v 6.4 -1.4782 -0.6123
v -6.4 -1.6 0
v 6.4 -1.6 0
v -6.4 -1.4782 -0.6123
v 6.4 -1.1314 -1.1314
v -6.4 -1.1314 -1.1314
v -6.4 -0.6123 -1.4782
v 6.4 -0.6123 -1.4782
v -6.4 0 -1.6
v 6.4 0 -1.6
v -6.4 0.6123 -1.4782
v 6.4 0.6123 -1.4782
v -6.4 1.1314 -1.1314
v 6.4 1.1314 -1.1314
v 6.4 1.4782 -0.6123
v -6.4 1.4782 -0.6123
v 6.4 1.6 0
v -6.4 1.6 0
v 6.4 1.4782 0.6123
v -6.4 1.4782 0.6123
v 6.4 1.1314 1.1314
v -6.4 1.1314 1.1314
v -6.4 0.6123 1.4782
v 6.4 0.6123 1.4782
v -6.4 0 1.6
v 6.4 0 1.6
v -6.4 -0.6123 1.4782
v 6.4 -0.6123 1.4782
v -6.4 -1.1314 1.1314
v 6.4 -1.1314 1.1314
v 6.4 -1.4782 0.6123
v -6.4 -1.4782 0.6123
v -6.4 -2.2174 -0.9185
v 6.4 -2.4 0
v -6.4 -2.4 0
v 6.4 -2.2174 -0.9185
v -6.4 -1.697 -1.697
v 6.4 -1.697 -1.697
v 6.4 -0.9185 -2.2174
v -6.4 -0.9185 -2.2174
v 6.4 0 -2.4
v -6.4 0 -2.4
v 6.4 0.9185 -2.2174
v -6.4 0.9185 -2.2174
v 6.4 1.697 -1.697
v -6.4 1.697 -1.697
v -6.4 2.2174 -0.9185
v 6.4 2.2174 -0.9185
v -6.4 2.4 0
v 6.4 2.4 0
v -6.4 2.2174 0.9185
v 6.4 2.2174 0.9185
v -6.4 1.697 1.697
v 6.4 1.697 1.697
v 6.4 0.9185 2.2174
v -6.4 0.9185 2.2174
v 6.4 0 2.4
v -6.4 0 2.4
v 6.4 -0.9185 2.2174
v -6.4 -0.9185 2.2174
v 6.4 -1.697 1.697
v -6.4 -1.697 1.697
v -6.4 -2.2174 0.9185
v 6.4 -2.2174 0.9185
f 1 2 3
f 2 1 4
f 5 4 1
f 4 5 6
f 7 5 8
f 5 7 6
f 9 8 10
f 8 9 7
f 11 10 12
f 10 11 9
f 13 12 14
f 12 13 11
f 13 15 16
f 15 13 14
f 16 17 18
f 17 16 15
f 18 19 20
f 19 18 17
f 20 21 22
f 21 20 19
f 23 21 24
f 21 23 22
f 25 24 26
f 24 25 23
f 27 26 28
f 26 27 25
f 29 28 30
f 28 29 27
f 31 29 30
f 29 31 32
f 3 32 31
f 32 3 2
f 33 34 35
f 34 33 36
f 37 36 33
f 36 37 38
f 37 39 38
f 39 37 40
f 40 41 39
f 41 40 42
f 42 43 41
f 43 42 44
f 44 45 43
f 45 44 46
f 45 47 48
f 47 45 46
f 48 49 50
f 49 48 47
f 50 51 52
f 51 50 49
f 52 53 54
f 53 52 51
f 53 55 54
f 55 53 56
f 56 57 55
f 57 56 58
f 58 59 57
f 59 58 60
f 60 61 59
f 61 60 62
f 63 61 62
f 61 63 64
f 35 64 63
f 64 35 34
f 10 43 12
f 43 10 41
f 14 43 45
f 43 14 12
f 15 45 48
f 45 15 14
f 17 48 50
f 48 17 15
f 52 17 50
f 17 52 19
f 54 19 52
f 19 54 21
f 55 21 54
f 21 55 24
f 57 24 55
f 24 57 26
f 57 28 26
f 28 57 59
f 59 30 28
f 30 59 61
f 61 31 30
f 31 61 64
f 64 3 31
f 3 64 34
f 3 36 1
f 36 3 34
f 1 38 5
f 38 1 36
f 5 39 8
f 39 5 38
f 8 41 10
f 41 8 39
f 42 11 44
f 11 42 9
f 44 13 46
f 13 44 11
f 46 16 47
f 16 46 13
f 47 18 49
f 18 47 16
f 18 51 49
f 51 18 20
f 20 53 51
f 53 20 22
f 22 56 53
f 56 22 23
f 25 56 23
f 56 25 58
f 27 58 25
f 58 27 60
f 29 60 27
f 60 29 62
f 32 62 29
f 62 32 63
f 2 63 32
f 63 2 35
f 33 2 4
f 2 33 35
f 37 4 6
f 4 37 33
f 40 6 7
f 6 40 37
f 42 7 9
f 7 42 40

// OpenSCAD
// file: ../p/4-4ring2.scad
use <../lib.scad>
function ldraw_lib__4_4ring2() = [
// 0 Ring  2 x 1.0
// 0 Name: 4-4ring2.dat
// 0 Author: James Jessiman
// 0 !LDRAW_ORG Primitive UPDATE 2009-01
// 0 !LICENSE Licensed under CC BY 2.0 and CC BY 4.0 : see CAreadme.txt
// 
// 0 BFC CERTIFY CCW
  [0,"BFC","CERTIFY"],
  [0,"BFC","CCW"],
// 
// 0 !HISTORY 1998-12-15 [PTadmin] Official Update 1998-10
// 0 !HISTORY 2002-04-05 [hafhead] Added BFC statement
// 0 !HISTORY 2002-04-25 [PTadmin] Official Update 2002-02
// 0 !HISTORY 2007-06-24 [PTadmin] Header formatted for Contributor Agreement
// 0 !HISTORY 2008-07-01 [PTadmin] Official Update 2008-01
// 0 !HISTORY 2008-08-26 [cwdee] Switch polygon winding and rename
// 0 !HISTORY 2009-05-02 [PTadmin] Official Update 2009-01
// 
// 
// 4 16 -1.1481 0 2.7717 -0.7654 0 1.8478 0 0 2 0 0 3
  [4,16,-1.1481,0,2.7717,-0.7654,0,1.8478,0,0,2,0,0,3],
// 4 16 -2.1213 0 2.1213 -1.4142 0 1.4142 -0.7654 0 1.8478 -1.1481 0 2.7717
  [4,16,-2.1213,0,2.1213,-1.4142,0,1.4142,-0.7654,0,1.8478,-1.1481,0,2.7717],
// 4 16 -2.7717 0 1.1481 -1.8478 0 0.7654 -1.4142 0 1.4142 -2.1213 0 2.1213
  [4,16,-2.7717,0,1.1481,-1.8478,0,0.7654,-1.4142,0,1.4142,-2.1213,0,2.1213],
// 4 16 -3 0 0 -2 0 0 -1.8478 0 0.7654 -2.7717 0 1.1481
  [4,16,-3,0,0,-2,0,0,-1.8478,0,0.7654,-2.7717,0,1.1481],
// 4 16 -2.7717 0 -1.1481 -1.8478 0 -0.7654 -2 0 0 -3 0 0
  [4,16,-2.7717,0,-1.1481,-1.8478,0,-0.7654,-2,0,0,-3,0,0],
// 4 16 -2.1213 0 -2.1213 -1.4142 0 -1.4142 -1.8478 0 -0.7654 -2.7717 0 -1.1481
  [4,16,-2.1213,0,-2.1213,-1.4142,0,-1.4142,-1.8478,0,-0.7654,-2.7717,0,-1.1481],
// 4 16 -1.1481 0 -2.7717 -0.7654 0 -1.8478 -1.4142 0 -1.4142 -2.1213 0 -2.1213
  [4,16,-1.1481,0,-2.7717,-0.7654,0,-1.8478,-1.4142,0,-1.4142,-2.1213,0,-2.1213],
// 4 16 0 0 -3 0 0 -2 -0.7654 0 -1.8478 -1.1481 0 -2.7717
  [4,16,0,0,-3,0,0,-2,-0.7654,0,-1.8478,-1.1481,0,-2.7717],
// 4 16 1.1481 0 -2.7717 0.7654 0 -1.8478 0 0 -2 0 0 -3
  [4,16,1.1481,0,-2.7717,0.7654,0,-1.8478,0,0,-2,0,0,-3],
// 4 16 2.1213 0 -2.1213 1.4142 0 -1.4142 0.7654 0 -1.8478 1.1481 0 -2.7717
  [4,16,2.1213,0,-2.1213,1.4142,0,-1.4142,0.7654,0,-1.8478,1.1481,0,-2.7717],
// 4 16 2.7717 0 -1.1481 1.8478 0 -0.7654 1.4142 0 -1.4142 2.1213 0 -2.1213
  [4,16,2.7717,0,-1.1481,1.8478,0,-0.7654,1.4142,0,-1.4142,2.1213,0,-2.1213],
// 4 16 3 0 0 2 0 0 1.8478 0 -0.7654 2.7717 0 -1.1481
  [4,16,3,0,0,2,0,0,1.8478,0,-0.7654,2.7717,0,-1.1481],
// 4 16 2.7717 0 1.1481 1.8478 0 0.7654 2 0 0 3 0 0
  [4,16,2.7717,0,1.1481,1.8478,0,0.7654,2,0,0,3,0,0],
// 4 16 2.1213 0 2.1213 1.4142 0 1.4142 1.8478 0 0.7654 2.7717 0 1.1481
  [4,16,2.1213,0,2.1213,1.4142,0,1.4142,1.8478,0,0.7654,2.7717,0,1.1481],
// 4 16 1.1481 0 2.7717 0.7654 0 1.8478 1.4142 0 1.4142 2.1213 0 2.1213
  [4,16,1.1481,0,2.7717,0.7654,0,1.8478,1.4142,0,1.4142,2.1213,0,2.1213],
// 4 16 0 0 3 0 0 2 0.7654 0 1.8478 1.1481 0 2.7717
  [4,16,0,0,3,0,0,2,0.7654,0,1.8478,1.1481,0,2.7717],
// 0
];
module ldraw_lib__4_4ring2(step=0, col=false, unit=2/5, alt=false, line=0.2, solid=!$preview)
    makepoly(ldraw_lib__4_4ring2(), step=step, col=col, unit=unit, alt=alt, line=line, solid=solid);
ldraw_lib__4_4ring2(line=0.2);
// file: ../p/4-4edge.scad
use <../lib.scad>
function ldraw_lib__4_4edge() = [
// 0 Circle 1.0
// 0 Name: 4-4edge.dat
// 0 Author: James Jessiman
// 0 !LDRAW_ORG Primitive UPDATE 2017-01
// 0 !LICENSE Licensed under CC BY 2.0 and CC BY 4.0 : see CAreadme.txt
// 
// 0 BFC CERTIFY CCW
  [0,"BFC","CERTIFY"],
  [0,"BFC","CCW"],
// 
// 0 !HISTORY 1998-12-15 [PTadmin] Official Update 1998-10
// 0 !HISTORY 2005-12-28 [PTadmin] Official Update 2005-01
// 0 !HISTORY 2007-06-24 [PTadmin] Header formatted for Contributor Agreement
// 0 !HISTORY 2008-07-01 [PTadmin] Official Update 2008-01
// 0 !HISTORY 2017-01-15 [Steffen] BFCed
// 0 !HISTORY 2017-12-30 [PTadmin] Official Update 2017-01
// 
// 
// 2 24 1 0 0 0.9239 0 0.3827
  [2,24,1,0,0,0.9239,0,0.3827],
// 2 24 0.9239 0 0.3827 0.7071 0 0.7071
  [2,24,0.9239,0,0.3827,0.7071,0,0.7071],
// 2 24 0.7071 0 0.7071 0.3827 0 0.9239
  [2,24,0.7071,0,0.7071,0.3827,0,0.9239],
// 2 24 0.3827 0 0.9239 0 0 1
  [2,24,0.3827,0,0.9239,0,0,1],
// 2 24 0 0 1 -0.3827 0 0.9239
  [2,24,0,0,1,-0.3827,0,0.9239],
// 2 24 -0.3827 0 0.9239 -0.7071 0 0.7071
  [2,24,-0.3827,0,0.9239,-0.7071,0,0.7071],
// 2 24 -0.7071 0 0.7071 -0.9239 0 0.3827
  [2,24,-0.7071,0,0.7071,-0.9239,0,0.3827],
// 2 24 -0.9239 0 0.3827 -1 0 -0
  [2,24,-0.9239,0,0.3827,-1,0,-0],
// 2 24 -1 0 -0 -0.9239 0 -0.3827
  [2,24,-1,0,-0,-0.9239,0,-0.3827],
// 2 24 -0.9239 0 -0.3827 -0.7071 0 -0.7071
  [2,24,-0.9239,0,-0.3827,-0.7071,0,-0.7071],
// 2 24 -0.7071 0 -0.7071 -0.3827 0 -0.9239
  [2,24,-0.7071,0,-0.7071,-0.3827,0,-0.9239],
// 2 24 -0.3827 0 -0.9239 0 0 -1
  [2,24,-0.3827,0,-0.9239,0,0,-1],
// 2 24 0 0 -1 0.3827 0 -0.9239
  [2,24,0,0,-1,0.3827,0,-0.9239],
// 2 24 0.3827 0 -0.9239 0.7071 0 -0.7071
  [2,24,0.3827,0,-0.9239,0.7071,0,-0.7071],
// 2 24 0.7071 0 -0.7071 0.9239 0 -0.3827
  [2,24,0.7071,0,-0.7071,0.9239,0,-0.3827],
// 2 24 0.9239 0 -0.3827 1 0 0
  [2,24,0.9239,0,-0.3827,1,0,0],
];
module ldraw_lib__4_4edge(step=0, col=false, unit=2/5, alt=false, line=0.2, solid=!$preview)
    makepoly(ldraw_lib__4_4edge(), step=step, col=col, unit=unit, alt=alt, line=line, solid=solid);
ldraw_lib__4_4edge(line=0.2);
// file: ../p/4-4cyli.scad
use <../lib.scad>
function ldraw_lib__4_4cyli() = [
// 0 Cylinder 1.0
// 0 Name: 4-4cyli.dat
// 0 Author: James Jessiman
// 0 !LDRAW_ORG Primitive UPDATE 2005-01
// 0 !LICENSE Licensed under CC BY 2.0 and CC BY 4.0 : see CAreadme.txt
// 
// 0 BFC CERTIFY CCW
  [0,"BFC","CERTIFY"],
  [0,"BFC","CCW"],
// 
// 0 !HISTORY 1998-12-15 [PTadmin] Official Update 1998-10
// 0 !HISTORY 2002-03-23 [sbliss] Added BFC statement; merged headers from files in distributions LDraw 0.27 and Complete.
// 0 !HISTORY 2002-04-25 [PTadmin] Official Update 2002-02
// 0 !HISTORY 2004-12-14 [guyvivan] BFC CCW
// 0 !HISTORY 2005-12-28 [PTadmin] Official Update 2005-01
// 0 !HISTORY 2007-06-24 [PTadmin] Header formatted for Contributor Agreement
// 0 !HISTORY 2008-07-01 [PTadmin] Official Update 2008-01
// 
// 
// 4 16 1 1 0 0.9239 1 0.3827 0.9239 0 0.3827 1 0 0
  [4,16,1,1,0,0.9239,1,0.3827,0.9239,0,0.3827,1,0,0],
// 5 24 1 0 0 1 1 0 0.9239 0 0.3827 0.9239 0 -0.3827
  [5,24,1,0,0,1,1,0,0.9239,0,0.3827,0.9239,0,-0.3827],
// 4 16 0.9239 1 0.3827 0.7071 1 0.7071 0.7071 0 0.7071 0.9239 0 0.3827
  [4,16,0.9239,1,0.3827,0.7071,1,0.7071,0.7071,0,0.7071,0.9239,0,0.3827],
// 5 24 0.9239 0 0.3827 0.9239 1 0.3827 0.7071 0 0.7071 1 0 0
  [5,24,0.9239,0,0.3827,0.9239,1,0.3827,0.7071,0,0.7071,1,0,0],
// 4 16 0.7071 1 0.7071 0.3827 1 0.9239 0.3827 0 0.9239 0.7071 0 0.7071
  [4,16,0.7071,1,0.7071,0.3827,1,0.9239,0.3827,0,0.9239,0.7071,0,0.7071],
// 5 24 0.7071 0 0.7071 0.7071 1 0.7071 0.3827 0 0.9239 0.9239 0 0.3827
  [5,24,0.7071,0,0.7071,0.7071,1,0.7071,0.3827,0,0.9239,0.9239,0,0.3827],
// 4 16 0.3827 1 0.9239 0 1 1 0 0 1 0.3827 0 0.9239
  [4,16,0.3827,1,0.9239,0,1,1,0,0,1,0.3827,0,0.9239],
// 5 24 0.3827 0 0.9239 0.3827 1 0.9239 0 0 1 0.7071 0 0.7071
  [5,24,0.3827,0,0.9239,0.3827,1,0.9239,0,0,1,0.7071,0,0.7071],
// 4 16 0 1 1 -0.3827 1 0.9239 -0.3827 0 0.9239 0 0 1
  [4,16,0,1,1,-0.3827,1,0.9239,-0.3827,0,0.9239,0,0,1],
// 5 24 0 0 1 0 1 1 -0.3827 0 0.9239 0.3827 0 0.9239
  [5,24,0,0,1,0,1,1,-0.3827,0,0.9239,0.3827,0,0.9239],
// 4 16 -0.3827 1 0.9239 -0.7071 1 0.7071 -0.7071 0 0.7071 -0.3827 0 0.9239
  [4,16,-0.3827,1,0.9239,-0.7071,1,0.7071,-0.7071,0,0.7071,-0.3827,0,0.9239],
// 5 24 -0.3827 0 0.9239 -0.3827 1 0.9239 -0.7071 0 0.7071 0 0 1
  [5,24,-0.3827,0,0.9239,-0.3827,1,0.9239,-0.7071,0,0.7071,0,0,1],
// 4 16 -0.7071 1 0.7071 -0.9239 1 0.3827 -0.9239 0 0.3827 -0.7071 0 0.7071
  [4,16,-0.7071,1,0.7071,-0.9239,1,0.3827,-0.9239,0,0.3827,-0.7071,0,0.7071],
// 5 24 -0.7071 0 0.7071 -0.7071 1 0.7071 -0.9239 0 0.3827 -0.3827 0 0.9239
  [5,24,-0.7071,0,0.7071,-0.7071,1,0.7071,-0.9239,0,0.3827,-0.3827,0,0.9239],
// 4 16 -0.9239 1 0.3827 -1 1 0 -1 0 0 -0.9239 0 0.3827
  [4,16,-0.9239,1,0.3827,-1,1,0,-1,0,0,-0.9239,0,0.3827],
// 5 24 -0.9239 0 0.3827 -0.9239 1 0.3827 -1 0 0 -0.7071 0 0.7071
  [5,24,-0.9239,0,0.3827,-0.9239,1,0.3827,-1,0,0,-0.7071,0,0.7071],
// 4 16 -1 1 0 -0.9239 1 -0.3827 -0.9239 0 -0.3827 -1 0 0
  [4,16,-1,1,0,-0.9239,1,-0.3827,-0.9239,0,-0.3827,-1,0,0],
// 5 24 -1 0 0 -1 1 0 -0.9239 0 -0.3827 -0.9239 0 0.3827
  [5,24,-1,0,0,-1,1,0,-0.9239,0,-0.3827,-0.9239,0,0.3827],
// 4 16 -0.9239 1 -0.3827 -0.7071 1 -0.7071 -0.7071 0 -0.7071 -0.9239 0 -0.3827
  [4,16,-0.9239,1,-0.3827,-0.7071,1,-0.7071,-0.7071,0,-0.7071,-0.9239,0,-0.3827],
// 5 24 -0.9239 0 -0.3827 -0.9239 1 -0.3827 -0.7071 0 -0.7071 -1 0 0
  [5,24,-0.9239,0,-0.3827,-0.9239,1,-0.3827,-0.7071,0,-0.7071,-1,0,0],
// 4 16 -0.7071 1 -0.7071 -0.3827 1 -0.9239 -0.3827 0 -0.9239 -0.7071 0 -0.7071
  [4,16,-0.7071,1,-0.7071,-0.3827,1,-0.9239,-0.3827,0,-0.9239,-0.7071,0,-0.7071],
// 5 24 -0.7071 0 -0.7071 -0.7071 1 -0.7071 -0.3827 0 -0.9239 -0.9239 0 -0.3827
  [5,24,-0.7071,0,-0.7071,-0.7071,1,-0.7071,-0.3827,0,-0.9239,-0.9239,0,-0.3827],
// 4 16 -0.3827 1 -0.9239 0 1 -1 0 0 -1 -0.3827 0 -0.9239
  [4,16,-0.3827,1,-0.9239,0,1,-1,0,0,-1,-0.3827,0,-0.9239],
// 5 24 -0.3827 0 -0.9239 -0.3827 1 -0.9239 0 0 -1 -0.7071 0 -0.7071
  [5,24,-0.3827,0,-0.9239,-0.3827,1,-0.9239,0,0,-1,-0.7071,0,-0.7071],
// 4 16 0 1 -1 0.3827 1 -0.9239 0.3827 0 -0.9239 0 0 -1
  [4,16,0,1,-1,0.3827,1,-0.9239,0.3827,0,-0.9239,0,0,-1],
// 5 24 0 0 -1 0 1 -1 0.3827 0 -0.9239 -0.3827 0 -0.9239
  [5,24,0,0,-1,0,1,-1,0.3827,0,-0.9239,-0.3827,0,-0.9239],
// 4 16 0.3827 1 -0.9239 0.7071 1 -0.7071 0.7071 0 -0.7071 0.3827 0 -0.9239
  [4,16,0.3827,1,-0.9239,0.7071,1,-0.7071,0.7071,0,-0.7071,0.3827,0,-0.9239],
// 5 24 0.3827 0 -0.9239 0.3827 1 -0.9239 0.7071 0 -0.7071 0 0 -1
  [5,24,0.3827,0,-0.9239,0.3827,1,-0.9239,0.7071,0,-0.7071,0,0,-1],
// 4 16 0.7071 1 -0.7071 0.9239 1 -0.3827 0.9239 0 -0.3827 0.7071 0 -0.7071
  [4,16,0.7071,1,-0.7071,0.9239,1,-0.3827,0.9239,0,-0.3827,0.7071,0,-0.7071],
// 5 24 0.7071 0 -0.7071 0.7071 1 -0.7071 0.9239 0 -0.3827 0.3827 0 -0.9239
  [5,24,0.7071,0,-0.7071,0.7071,1,-0.7071,0.9239,0,-0.3827,0.3827,0,-0.9239],
// 4 16 0.9239 1 -0.3827 1 1 0 1 0 0 0.9239 0 -0.3827
  [4,16,0.9239,1,-0.3827,1,1,0,1,0,0,0.9239,0,-0.3827],
// 5 24 0.9239 0 -0.3827 0.9239 1 -0.3827 1 0 0 0.7071 0 -0.7071
  [5,24,0.9239,0,-0.3827,0.9239,1,-0.3827,1,0,0,0.7071,0,-0.7071],
// 0
];
module ldraw_lib__4_4cyli(step=0, col=false, unit=2/5, alt=false, line=0.2, solid=!$preview)
    makepoly(ldraw_lib__4_4cyli(), step=step, col=col, unit=unit, alt=alt, line=line, solid=solid);
ldraw_lib__4_4cyli(line=0.2);
// file: 3112.scad
use <../lib.scad>
use <../p/4-4cyli.scad>
use <../p/4-4edge.scad>
use <../p/4-4ring2.scad>
function ldraw_lib__3112() = [
// 0 ~Axle Bush 1.6L
// 0 Name: 3112.dat
// 0 Author: James Jessiman
// 0 !LDRAW_ORG Part UPDATE 2018-02
// 0 !LICENSE Licensed under CC BY 2.0 and CC BY 4.0 : see CAreadme.txt
// 
// 0 BFC CERTIFY CW
  [0,"BFC","CERTIFY"],
  [0,"BFC","CW"],
// 
// 0 !CATEGORY Wheel
// 
// 0 !HISTORY 2007-06-25 [PTadmin] Header formatted for Contributor Agreement
// 0 !HISTORY 2008-07-01 [PTadmin] Official Update 2008-01
// 0 !HISTORY 2008-07-07 [mkennedy] Completed header, BFC'ed, Optimized
// 0 !HISTORY 2008-08-23 [PTadmin] Renamed from 34c
// 0 !HISTORY 2009-05-02 [PTadmin] Official Update 2009-01
// 0 !HISTORY 2018-11-24 [cwdee] Update description
// 0 !HISTORY 2018-12-08 [PTadmin] Official Update 2018-02
// 
// 
// 0 BFC INVERTNEXT
  [0,"BFC","INVERTNEXT"],
// 1 16 0 0 -16 4 0 0 0 0 4 0 32 0 4-4cyli.dat
  [1,16,0,0,-16,4,0,0,0,0,4,0,32,0, ldraw_lib__4_4cyli()],
// 1 16 0 0 -16 6 0 0 0 0 6 0 32 0 4-4cyli.dat
  [1,16,0,0,-16,6,0,0,0,0,6,0,32,0, ldraw_lib__4_4cyli()],
// 1 16 0 0 -16 4 0 0 0 0 4 0 1 0 4-4edge.dat
  [1,16,0,0,-16,4,0,0,0,0,4,0,1,0, ldraw_lib__4_4edge()],
// 1 16 0 0 16 4 0 0 0 0 4 0 1 0 4-4edge.dat
  [1,16,0,0,16,4,0,0,0,0,4,0,1,0, ldraw_lib__4_4edge()],
// 1 16 0 0 -16 6 0 0 0 0 6 0 1 0 4-4edge.dat
  [1,16,0,0,-16,6,0,0,0,0,6,0,1,0, ldraw_lib__4_4edge()],
// 1 16 0 0 16 6 0 0 0 0 6 0 1 0 4-4edge.dat
  [1,16,0,0,16,6,0,0,0,0,6,0,1,0, ldraw_lib__4_4edge()],
// 1 16 0 0 16 2 0 0 0 0 2 0 -1 0 4-4ring2.dat
  [1,16,0,0,16,2,0,0,0,0,2,0,-1,0, ldraw_lib__4_4ring2()],
// 1 16 0 0 -16 2 0 0 0 0 2 0 1 0 4-4ring2.dat
  [1,16,0,0,-16,2,0,0,0,0,2,0,1,0, ldraw_lib__4_4ring2()],
// 0
// 
];
module ldraw_lib__3112(step=0, col=false, unit=2/5, alt=false, line=0.2, solid=!$preview)
    makepoly(ldraw_lib__3112(), step=step, col=col, unit=unit, alt=alt, line=line, solid=solid);
ldraw_lib__3112(line=0.2);
// file: 313.scad
use <../lib.scad>
use <3112.scad>
function ldraw_lib__313() = [
// 0 ~Hinge Plate  2 x  5 Pivot
// 0 Name: 313.dat
// 0 Author: James Jessiman
// 0 !LDRAW_ORG Part UPDATE 2009-03
// 0 !LICENSE Licensed under CC BY 2.0 and CC BY 4.0 : see CAreadme.txt
// 
// 0 BFC CERTIFY CCW
  [0,"BFC","CERTIFY"],
  [0,"BFC","CCW"],
// 
// 0 !HISTORY 1999-05-17 [PTadmin] Official Update 1999-03
// 0 !HISTORY 2007-10-26 [PTadmin] Header formatted for Contributor Agreement
// 0 !HISTORY 2008-07-01 [PTadmin] Official Update 2008-01
// 0 !HISTORY 2008-07-07 [guyvivan] Made BFC Compliant (2004-11-16)
// 0 !HISTORY 2008-07-08 [guyvivan] Replace stud2a by primitives (2006-07-26)
// 0 !HISTORY 2009-08-24 [cwdee] Change to reference to 3112 as this is the same part used in different ways
// 0 !HISTORY 2009-12-29 [PTadmin] Official Update 2009-03
// 
// 
// 1 16 0 0 0 0 0 1 0 1 0 -1 0 0 3112.dat
  [1,16,0,0,0,0,0,1,0,1,0,-1,0,0, ldraw_lib__3112()],
// 0
];
module ldraw_lib__313(step=0, col=false, unit=2/5, alt=false, line=0.2, solid=!$preview)
    makepoly(ldraw_lib__313(), step=step, col=col, unit=unit, alt=alt, line=line, solid=solid);
ldraw_lib__313(line=0.2);
// main file
use <../lib.scad>
use <313.scad>
function ldraw_lib__3149a() = [
// 0 ~Moved to 313
// 0 Name: 3149a.dat
// 0 Author: [PTadmin]
// 0 !LDRAW_ORG Part UPDATE 1999-03
// 0 !LICENSE Licensed under CC BY 4.0 : see CAreadme.txt
// 
// 0 BFC CERTIFY CCW
  [0,"BFC","CERTIFY"],
  [0,"BFC","CCW"],
// 
// 0 !HISTORY 1999-02-01 [PTadmin] Official Update 1999-01
// 0 !HISTORY 1999-05-17 [PTadmin] Official Update 1999-03
// 0 !HISTORY 2007-06-24 [PTadmin] Header formatted for Contributor Agreement
// 0 !HISTORY 2008-07-01 [PTadmin] Official Update 2008-01
// 
// 
// 1 16 0 0 0 1 0 0 0 1 0 0 0 1 313.dat
  [1,16,0,0,0,1,0,0,0,1,0,0,0,1, ldraw_lib__313()],
];
module ldraw_lib__3149a(step=0, col=false, unit=2/5, alt=false, line=0.2, solid=!$preview)
    makepoly(ldraw_lib__3149a(), step=step, col=col, unit=unit, alt=alt, line=line, solid=solid);
ldraw_lib__3149a(line=0.2);
